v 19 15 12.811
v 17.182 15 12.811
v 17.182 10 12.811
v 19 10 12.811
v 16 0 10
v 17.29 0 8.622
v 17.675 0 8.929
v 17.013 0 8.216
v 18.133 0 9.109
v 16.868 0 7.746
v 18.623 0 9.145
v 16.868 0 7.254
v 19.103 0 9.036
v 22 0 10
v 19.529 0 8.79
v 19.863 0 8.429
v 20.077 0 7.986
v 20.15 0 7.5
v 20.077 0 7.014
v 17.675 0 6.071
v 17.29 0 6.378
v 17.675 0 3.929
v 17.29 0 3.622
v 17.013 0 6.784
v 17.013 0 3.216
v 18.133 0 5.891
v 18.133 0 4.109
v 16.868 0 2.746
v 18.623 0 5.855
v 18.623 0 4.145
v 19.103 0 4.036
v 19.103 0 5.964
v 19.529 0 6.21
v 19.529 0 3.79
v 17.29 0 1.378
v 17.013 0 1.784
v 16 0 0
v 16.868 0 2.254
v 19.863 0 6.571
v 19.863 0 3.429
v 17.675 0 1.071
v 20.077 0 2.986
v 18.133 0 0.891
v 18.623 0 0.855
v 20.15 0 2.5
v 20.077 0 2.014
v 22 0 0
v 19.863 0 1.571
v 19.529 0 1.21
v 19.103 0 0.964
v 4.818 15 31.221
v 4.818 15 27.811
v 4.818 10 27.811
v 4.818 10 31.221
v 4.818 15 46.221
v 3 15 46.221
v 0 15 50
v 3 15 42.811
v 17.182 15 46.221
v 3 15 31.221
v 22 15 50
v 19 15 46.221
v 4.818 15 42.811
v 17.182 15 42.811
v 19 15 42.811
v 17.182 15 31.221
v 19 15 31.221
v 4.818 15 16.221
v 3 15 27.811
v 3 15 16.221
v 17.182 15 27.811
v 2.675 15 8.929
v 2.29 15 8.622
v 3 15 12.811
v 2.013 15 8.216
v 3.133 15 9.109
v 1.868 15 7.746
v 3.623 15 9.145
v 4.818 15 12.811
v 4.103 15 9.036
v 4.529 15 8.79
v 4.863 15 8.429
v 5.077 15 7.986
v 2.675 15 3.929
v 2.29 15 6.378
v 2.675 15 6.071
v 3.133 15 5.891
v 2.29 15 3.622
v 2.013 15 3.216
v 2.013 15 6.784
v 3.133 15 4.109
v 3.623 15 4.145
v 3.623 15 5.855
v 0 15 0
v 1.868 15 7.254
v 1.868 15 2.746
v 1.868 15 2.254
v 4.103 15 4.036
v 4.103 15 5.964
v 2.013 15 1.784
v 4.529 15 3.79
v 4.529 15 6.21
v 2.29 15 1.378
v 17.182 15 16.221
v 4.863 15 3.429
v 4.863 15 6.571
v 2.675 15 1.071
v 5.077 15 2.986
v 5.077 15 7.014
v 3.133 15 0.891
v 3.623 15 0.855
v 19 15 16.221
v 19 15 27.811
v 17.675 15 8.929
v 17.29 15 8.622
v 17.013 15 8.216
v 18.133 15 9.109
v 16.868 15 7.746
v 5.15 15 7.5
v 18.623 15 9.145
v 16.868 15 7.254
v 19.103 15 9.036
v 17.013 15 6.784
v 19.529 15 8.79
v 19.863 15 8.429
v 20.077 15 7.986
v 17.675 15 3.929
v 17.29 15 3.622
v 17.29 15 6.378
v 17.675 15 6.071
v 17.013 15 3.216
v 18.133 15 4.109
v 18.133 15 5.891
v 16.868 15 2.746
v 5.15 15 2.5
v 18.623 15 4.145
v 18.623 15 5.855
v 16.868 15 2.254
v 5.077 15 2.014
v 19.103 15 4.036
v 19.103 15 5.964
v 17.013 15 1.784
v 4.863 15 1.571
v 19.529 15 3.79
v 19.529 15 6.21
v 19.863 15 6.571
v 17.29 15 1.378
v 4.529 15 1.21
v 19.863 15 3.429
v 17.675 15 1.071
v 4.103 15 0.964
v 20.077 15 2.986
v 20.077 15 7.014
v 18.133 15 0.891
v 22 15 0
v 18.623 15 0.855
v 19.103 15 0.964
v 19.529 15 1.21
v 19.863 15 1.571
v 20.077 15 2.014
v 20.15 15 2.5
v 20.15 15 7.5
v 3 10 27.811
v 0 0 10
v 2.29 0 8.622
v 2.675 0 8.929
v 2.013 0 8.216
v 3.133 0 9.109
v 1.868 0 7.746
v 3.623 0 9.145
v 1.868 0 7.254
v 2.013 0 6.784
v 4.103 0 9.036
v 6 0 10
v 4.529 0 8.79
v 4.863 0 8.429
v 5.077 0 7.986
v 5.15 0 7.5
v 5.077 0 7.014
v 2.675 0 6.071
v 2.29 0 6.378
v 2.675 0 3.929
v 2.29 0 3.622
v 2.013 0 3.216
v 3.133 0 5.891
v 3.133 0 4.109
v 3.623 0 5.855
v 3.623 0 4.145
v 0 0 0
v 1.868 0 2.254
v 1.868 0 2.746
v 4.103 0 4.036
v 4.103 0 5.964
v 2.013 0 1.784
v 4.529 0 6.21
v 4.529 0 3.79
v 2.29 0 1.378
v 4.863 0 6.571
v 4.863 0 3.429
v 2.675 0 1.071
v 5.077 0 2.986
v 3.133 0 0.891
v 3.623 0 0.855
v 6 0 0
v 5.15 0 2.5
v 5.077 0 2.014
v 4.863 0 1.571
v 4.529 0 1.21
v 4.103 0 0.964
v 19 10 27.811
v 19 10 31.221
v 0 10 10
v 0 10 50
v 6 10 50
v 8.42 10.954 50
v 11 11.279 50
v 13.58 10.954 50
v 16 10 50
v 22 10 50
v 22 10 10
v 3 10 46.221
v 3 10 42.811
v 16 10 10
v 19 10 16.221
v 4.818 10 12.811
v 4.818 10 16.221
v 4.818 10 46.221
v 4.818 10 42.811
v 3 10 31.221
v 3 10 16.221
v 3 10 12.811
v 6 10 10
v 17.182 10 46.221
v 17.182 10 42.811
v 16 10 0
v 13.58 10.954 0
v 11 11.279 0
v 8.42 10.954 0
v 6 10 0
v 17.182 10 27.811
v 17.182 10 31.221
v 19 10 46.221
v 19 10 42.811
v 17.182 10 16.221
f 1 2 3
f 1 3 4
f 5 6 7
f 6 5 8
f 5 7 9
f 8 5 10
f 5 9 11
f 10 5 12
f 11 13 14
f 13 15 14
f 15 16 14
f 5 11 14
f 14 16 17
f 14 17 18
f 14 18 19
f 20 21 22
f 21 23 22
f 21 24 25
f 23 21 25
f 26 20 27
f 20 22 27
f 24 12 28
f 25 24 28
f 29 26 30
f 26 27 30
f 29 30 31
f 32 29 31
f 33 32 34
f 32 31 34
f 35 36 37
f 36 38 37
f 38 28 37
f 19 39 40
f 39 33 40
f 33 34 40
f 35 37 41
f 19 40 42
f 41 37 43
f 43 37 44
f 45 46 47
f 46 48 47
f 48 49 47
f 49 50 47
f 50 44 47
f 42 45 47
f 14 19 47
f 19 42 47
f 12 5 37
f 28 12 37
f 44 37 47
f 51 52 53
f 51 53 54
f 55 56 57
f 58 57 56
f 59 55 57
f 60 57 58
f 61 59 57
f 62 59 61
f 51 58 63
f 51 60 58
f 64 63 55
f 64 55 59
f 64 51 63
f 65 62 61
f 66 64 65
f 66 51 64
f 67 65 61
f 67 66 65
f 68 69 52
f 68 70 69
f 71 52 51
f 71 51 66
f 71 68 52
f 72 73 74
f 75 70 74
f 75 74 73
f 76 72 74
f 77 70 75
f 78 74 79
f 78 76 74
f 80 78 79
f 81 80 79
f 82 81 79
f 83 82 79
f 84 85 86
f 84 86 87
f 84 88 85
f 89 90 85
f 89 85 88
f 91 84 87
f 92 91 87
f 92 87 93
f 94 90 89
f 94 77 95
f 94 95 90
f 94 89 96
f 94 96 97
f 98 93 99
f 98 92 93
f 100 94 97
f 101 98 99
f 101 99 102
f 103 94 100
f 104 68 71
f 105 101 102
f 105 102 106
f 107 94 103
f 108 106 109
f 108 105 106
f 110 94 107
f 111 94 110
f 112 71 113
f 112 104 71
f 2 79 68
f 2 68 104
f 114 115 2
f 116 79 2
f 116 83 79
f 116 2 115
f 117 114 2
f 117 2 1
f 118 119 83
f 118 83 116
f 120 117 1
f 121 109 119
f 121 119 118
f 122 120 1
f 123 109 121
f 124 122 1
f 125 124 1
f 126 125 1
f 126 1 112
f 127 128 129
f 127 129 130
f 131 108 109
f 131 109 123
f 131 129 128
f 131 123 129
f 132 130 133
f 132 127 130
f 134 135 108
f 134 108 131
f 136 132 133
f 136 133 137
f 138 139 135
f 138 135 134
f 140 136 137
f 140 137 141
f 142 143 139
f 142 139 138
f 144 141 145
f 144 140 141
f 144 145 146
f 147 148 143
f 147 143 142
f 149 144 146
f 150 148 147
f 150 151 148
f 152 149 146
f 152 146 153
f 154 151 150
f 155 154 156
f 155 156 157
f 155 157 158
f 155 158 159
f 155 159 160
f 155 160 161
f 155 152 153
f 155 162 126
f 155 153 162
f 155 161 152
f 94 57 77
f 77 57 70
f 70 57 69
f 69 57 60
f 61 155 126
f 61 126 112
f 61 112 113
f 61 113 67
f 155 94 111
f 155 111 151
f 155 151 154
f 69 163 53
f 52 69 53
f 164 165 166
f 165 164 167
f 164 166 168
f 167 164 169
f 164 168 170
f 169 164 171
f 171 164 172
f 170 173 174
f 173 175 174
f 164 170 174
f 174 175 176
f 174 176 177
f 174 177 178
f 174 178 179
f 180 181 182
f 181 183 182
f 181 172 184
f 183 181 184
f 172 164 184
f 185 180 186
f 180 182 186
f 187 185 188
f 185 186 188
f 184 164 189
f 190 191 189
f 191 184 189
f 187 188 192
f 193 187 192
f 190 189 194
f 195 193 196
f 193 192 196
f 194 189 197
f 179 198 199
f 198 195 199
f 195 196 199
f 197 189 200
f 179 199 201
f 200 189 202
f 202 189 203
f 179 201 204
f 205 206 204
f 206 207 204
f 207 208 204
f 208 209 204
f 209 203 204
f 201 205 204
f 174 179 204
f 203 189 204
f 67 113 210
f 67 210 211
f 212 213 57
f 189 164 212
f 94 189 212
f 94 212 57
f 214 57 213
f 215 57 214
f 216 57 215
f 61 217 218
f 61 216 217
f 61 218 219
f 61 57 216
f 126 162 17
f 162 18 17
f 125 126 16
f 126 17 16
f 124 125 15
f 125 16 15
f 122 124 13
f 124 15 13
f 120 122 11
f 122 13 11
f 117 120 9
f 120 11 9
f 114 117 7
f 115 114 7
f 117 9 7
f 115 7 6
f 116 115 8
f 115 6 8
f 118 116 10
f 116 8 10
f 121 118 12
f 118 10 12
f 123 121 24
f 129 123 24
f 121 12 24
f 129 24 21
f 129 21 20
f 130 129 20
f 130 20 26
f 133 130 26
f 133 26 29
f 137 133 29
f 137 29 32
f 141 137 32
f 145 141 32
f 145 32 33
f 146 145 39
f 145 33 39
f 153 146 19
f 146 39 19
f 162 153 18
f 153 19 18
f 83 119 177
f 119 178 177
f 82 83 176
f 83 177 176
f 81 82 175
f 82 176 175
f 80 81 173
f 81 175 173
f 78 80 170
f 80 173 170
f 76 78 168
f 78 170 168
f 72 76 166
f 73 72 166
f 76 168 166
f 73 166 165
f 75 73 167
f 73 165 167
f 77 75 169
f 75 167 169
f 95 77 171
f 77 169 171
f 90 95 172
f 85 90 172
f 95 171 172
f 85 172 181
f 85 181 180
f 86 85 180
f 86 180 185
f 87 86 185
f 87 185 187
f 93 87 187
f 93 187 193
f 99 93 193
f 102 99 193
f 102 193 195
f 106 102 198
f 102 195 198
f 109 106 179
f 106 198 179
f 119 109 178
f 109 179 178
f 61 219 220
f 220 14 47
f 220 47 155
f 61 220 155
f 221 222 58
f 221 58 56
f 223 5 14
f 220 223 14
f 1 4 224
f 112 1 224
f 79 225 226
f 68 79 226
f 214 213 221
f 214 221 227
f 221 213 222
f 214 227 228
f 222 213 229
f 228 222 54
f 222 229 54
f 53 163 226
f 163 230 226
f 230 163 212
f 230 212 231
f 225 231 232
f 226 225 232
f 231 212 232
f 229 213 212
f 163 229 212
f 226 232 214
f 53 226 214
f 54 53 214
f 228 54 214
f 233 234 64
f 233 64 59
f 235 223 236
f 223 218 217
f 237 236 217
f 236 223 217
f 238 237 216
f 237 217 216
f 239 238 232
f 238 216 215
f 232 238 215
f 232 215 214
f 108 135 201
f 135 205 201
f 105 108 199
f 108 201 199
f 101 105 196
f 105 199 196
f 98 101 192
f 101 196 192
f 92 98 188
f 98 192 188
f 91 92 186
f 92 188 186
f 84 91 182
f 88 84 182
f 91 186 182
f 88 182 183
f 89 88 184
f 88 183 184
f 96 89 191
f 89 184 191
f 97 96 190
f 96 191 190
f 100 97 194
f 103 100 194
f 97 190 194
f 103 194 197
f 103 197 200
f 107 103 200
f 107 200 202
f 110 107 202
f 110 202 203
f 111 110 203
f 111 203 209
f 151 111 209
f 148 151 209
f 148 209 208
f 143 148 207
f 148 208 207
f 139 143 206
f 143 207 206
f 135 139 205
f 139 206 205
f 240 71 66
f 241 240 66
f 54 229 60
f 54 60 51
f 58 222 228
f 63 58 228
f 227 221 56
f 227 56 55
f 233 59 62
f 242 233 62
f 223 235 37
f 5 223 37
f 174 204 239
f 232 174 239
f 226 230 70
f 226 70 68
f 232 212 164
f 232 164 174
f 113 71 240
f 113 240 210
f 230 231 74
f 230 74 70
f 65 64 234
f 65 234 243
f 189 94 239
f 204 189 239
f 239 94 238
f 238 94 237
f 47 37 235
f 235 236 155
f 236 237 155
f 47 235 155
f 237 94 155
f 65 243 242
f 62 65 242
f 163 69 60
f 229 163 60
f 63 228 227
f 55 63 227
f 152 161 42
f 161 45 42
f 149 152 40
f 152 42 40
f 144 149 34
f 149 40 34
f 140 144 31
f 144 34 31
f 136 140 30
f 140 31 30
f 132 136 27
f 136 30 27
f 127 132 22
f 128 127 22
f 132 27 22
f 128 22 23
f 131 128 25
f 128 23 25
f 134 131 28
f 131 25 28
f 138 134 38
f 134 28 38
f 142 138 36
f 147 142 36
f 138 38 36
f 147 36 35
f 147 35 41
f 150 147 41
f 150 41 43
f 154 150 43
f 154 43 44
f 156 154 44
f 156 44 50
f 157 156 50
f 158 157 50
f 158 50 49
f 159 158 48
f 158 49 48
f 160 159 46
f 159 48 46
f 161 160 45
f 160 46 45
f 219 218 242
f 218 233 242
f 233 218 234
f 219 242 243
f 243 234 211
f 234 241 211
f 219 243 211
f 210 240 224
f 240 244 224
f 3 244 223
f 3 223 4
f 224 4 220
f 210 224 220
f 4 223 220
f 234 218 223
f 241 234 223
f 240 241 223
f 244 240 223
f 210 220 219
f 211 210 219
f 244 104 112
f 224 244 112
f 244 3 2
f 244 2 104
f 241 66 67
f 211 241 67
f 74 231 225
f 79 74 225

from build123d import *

# Parameters (mm, degrees)
F1_DEPTH      = 10
F2_W          = 22
F2_H          = 5
F3_DEPTH      = 40
F4_W          = 1.8184431829
F4_H          = 3.4095803276
F4_R          = 1.65
F5_DEPTH      = 25
F5_DEPTH_BACK = 25
F7_DEPTH      = 50.001


with BuildPart() as f1:
    # F0 (on Top) → F1 (new body)
    with BuildSketch(Plane.XY):
        Polygon((0, 15), (0, 0), (6, 0), (6, 10), (16, 10), (16, 0), (22, 0), (22, 15), align=None)
    extrude(amount=F1_DEPTH)

    # F2 (on face) → F3 (join)
    with BuildSketch(Plane.XY.offset(10)):
        with Locations((11, 12.5)):
            Rectangle(F2_W, F2_H)
    extrude(amount=F3_DEPTH)

    # F4 (on face) → F5 (cut, two sides)
    with BuildSketch(Plane.XZ.offset(-10)) as f5_sk:
        with Locations((3.9092215914, 14.5157719962)):
            Rectangle(F4_W, F4_H)
        with Locations((18.0907784086, 14.5157719962)):
            Rectangle(F4_W, F4_H)
        with Locations((18.5, 2.5)):
            Circle(F4_R)
        with Locations((3.5, 2.5)):
            Circle(F4_R)
        with Locations((18.0907784086, 29.5157719962)):
            Rectangle(F4_W, F4_H)
        with Locations((18.0907784086, 44.5157719962)):
            Rectangle(F4_W, F4_H)
        with Locations((3.9092215914, 29.5157719962)):
            Rectangle(F4_W, F4_H)
        with Locations((3.9092215914, 44.5157719962)):
            Rectangle(F4_W, F4_H)
        with Locations((18.5, 7.5)):
            Circle(F4_R)
        with Locations((3.5, 7.5)):
            Circle(F4_R)
    extrude(amount=-F5_DEPTH, mode=Mode.SUBTRACT)
    extrude(f5_sk.sketch, amount=F5_DEPTH_BACK, mode=Mode.SUBTRACT)

    # F6 (on face) → F7 (cut, through all)
    with BuildSketch(Plane.XY.offset(50)):
        with BuildLine():
            Line((6, 10), (16, 10))
            ThreePointArc((16, 10), (11, 11.2785394519), (6, 10))
        make_face()
    extrude(amount=-F7_DEPTH, mode=Mode.SUBTRACT)


solid = f1.part
